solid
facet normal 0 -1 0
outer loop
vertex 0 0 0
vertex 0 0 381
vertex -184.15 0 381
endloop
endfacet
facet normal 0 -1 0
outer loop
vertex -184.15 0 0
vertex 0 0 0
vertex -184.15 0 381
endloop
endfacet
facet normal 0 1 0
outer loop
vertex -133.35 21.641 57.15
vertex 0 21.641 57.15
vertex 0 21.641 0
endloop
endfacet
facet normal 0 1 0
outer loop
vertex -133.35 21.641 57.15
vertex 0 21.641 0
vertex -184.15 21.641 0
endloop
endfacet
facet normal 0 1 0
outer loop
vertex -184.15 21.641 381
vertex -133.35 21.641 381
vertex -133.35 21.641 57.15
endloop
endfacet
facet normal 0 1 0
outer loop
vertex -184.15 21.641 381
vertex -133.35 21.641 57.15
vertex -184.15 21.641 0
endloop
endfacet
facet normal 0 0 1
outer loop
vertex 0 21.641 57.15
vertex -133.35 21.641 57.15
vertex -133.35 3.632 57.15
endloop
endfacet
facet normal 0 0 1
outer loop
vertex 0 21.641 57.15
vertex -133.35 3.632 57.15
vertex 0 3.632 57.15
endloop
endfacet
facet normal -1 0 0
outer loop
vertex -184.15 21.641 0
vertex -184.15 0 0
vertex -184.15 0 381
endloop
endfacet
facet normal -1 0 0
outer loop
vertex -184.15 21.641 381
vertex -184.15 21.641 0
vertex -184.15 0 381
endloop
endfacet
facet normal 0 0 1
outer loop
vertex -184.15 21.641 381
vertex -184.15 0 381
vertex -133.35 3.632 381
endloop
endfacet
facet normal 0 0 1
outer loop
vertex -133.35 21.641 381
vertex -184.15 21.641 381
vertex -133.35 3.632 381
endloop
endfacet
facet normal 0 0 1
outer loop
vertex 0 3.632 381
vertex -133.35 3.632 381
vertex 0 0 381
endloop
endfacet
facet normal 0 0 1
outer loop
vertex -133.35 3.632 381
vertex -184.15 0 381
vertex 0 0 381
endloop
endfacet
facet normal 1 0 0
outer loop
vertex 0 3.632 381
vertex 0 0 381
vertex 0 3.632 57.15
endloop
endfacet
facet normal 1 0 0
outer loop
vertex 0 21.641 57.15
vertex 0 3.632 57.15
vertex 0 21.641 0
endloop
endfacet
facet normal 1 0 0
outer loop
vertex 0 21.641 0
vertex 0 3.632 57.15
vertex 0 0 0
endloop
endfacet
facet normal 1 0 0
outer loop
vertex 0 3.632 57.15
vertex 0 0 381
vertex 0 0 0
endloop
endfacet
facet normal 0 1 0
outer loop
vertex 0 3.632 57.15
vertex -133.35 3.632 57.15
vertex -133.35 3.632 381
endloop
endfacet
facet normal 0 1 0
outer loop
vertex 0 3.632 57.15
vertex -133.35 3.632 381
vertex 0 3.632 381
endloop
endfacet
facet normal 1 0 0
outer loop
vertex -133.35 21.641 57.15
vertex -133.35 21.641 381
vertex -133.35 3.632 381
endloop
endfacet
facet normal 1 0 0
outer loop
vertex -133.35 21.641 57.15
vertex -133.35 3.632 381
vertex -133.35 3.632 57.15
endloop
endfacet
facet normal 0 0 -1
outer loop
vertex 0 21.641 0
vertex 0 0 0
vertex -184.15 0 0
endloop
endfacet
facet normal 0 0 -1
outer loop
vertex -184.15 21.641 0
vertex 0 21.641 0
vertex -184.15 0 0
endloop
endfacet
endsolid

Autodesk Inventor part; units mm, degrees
ref_plane "YZ Plane" through (0, 0, 0) normal (1, 0, 0) x (0, 1, 0)
ref_plane "XZ Plane" through (0, 0, 0) normal (0, 1, 0) x (-1, 0, 0)
ref_plane "XY Plane" through (0, 0, 0) normal (0, 0, 1) x (1, 0, 0)
sketch "Sketch1" plane through (0, 0, 0) normal (0, 1, 0) x (-1, 0, 0)
  line L0 (0, 0) -> (184.15, 0)
  line L1 (184.15, 0) -> (184.15, 381)
  line L2 (184.15, 381) -> (0, 381)
  line L3 (0, 381) -> (0, 0)
  dimension "d0" = 184.15
  dimension "d1" = 381
extrude "Extrusion1" add sketch "Sketch1" along normal blind 21.6408
sketch "Sketch2" plane through (0, 21.6408, 0) normal (0, 1, 0) x (1, 0, 0)
  line L0 (0, -381) -> (-133.35, -381)
  line L1 (-133.35, -381) -> (-133.35, -57.15)
  line L2 (-133.35, -57.15) -> (0, -57.15)
  line L3 (0, -57.15) -> (0, -381)
  line L4 (0, -381) -> (0, 0) projected
  line L5 (-184.15, -381) -> (0, -381) projected
  dimension "d4" = 133.35
  dimension "d5" = 323.85
  dimension "d6" = 0
  dimension "d7" = 0
extrude "Extrusion2" cut sketch "Sketch2" against normal blind 18.0086
properties part number "Case stock 1"
